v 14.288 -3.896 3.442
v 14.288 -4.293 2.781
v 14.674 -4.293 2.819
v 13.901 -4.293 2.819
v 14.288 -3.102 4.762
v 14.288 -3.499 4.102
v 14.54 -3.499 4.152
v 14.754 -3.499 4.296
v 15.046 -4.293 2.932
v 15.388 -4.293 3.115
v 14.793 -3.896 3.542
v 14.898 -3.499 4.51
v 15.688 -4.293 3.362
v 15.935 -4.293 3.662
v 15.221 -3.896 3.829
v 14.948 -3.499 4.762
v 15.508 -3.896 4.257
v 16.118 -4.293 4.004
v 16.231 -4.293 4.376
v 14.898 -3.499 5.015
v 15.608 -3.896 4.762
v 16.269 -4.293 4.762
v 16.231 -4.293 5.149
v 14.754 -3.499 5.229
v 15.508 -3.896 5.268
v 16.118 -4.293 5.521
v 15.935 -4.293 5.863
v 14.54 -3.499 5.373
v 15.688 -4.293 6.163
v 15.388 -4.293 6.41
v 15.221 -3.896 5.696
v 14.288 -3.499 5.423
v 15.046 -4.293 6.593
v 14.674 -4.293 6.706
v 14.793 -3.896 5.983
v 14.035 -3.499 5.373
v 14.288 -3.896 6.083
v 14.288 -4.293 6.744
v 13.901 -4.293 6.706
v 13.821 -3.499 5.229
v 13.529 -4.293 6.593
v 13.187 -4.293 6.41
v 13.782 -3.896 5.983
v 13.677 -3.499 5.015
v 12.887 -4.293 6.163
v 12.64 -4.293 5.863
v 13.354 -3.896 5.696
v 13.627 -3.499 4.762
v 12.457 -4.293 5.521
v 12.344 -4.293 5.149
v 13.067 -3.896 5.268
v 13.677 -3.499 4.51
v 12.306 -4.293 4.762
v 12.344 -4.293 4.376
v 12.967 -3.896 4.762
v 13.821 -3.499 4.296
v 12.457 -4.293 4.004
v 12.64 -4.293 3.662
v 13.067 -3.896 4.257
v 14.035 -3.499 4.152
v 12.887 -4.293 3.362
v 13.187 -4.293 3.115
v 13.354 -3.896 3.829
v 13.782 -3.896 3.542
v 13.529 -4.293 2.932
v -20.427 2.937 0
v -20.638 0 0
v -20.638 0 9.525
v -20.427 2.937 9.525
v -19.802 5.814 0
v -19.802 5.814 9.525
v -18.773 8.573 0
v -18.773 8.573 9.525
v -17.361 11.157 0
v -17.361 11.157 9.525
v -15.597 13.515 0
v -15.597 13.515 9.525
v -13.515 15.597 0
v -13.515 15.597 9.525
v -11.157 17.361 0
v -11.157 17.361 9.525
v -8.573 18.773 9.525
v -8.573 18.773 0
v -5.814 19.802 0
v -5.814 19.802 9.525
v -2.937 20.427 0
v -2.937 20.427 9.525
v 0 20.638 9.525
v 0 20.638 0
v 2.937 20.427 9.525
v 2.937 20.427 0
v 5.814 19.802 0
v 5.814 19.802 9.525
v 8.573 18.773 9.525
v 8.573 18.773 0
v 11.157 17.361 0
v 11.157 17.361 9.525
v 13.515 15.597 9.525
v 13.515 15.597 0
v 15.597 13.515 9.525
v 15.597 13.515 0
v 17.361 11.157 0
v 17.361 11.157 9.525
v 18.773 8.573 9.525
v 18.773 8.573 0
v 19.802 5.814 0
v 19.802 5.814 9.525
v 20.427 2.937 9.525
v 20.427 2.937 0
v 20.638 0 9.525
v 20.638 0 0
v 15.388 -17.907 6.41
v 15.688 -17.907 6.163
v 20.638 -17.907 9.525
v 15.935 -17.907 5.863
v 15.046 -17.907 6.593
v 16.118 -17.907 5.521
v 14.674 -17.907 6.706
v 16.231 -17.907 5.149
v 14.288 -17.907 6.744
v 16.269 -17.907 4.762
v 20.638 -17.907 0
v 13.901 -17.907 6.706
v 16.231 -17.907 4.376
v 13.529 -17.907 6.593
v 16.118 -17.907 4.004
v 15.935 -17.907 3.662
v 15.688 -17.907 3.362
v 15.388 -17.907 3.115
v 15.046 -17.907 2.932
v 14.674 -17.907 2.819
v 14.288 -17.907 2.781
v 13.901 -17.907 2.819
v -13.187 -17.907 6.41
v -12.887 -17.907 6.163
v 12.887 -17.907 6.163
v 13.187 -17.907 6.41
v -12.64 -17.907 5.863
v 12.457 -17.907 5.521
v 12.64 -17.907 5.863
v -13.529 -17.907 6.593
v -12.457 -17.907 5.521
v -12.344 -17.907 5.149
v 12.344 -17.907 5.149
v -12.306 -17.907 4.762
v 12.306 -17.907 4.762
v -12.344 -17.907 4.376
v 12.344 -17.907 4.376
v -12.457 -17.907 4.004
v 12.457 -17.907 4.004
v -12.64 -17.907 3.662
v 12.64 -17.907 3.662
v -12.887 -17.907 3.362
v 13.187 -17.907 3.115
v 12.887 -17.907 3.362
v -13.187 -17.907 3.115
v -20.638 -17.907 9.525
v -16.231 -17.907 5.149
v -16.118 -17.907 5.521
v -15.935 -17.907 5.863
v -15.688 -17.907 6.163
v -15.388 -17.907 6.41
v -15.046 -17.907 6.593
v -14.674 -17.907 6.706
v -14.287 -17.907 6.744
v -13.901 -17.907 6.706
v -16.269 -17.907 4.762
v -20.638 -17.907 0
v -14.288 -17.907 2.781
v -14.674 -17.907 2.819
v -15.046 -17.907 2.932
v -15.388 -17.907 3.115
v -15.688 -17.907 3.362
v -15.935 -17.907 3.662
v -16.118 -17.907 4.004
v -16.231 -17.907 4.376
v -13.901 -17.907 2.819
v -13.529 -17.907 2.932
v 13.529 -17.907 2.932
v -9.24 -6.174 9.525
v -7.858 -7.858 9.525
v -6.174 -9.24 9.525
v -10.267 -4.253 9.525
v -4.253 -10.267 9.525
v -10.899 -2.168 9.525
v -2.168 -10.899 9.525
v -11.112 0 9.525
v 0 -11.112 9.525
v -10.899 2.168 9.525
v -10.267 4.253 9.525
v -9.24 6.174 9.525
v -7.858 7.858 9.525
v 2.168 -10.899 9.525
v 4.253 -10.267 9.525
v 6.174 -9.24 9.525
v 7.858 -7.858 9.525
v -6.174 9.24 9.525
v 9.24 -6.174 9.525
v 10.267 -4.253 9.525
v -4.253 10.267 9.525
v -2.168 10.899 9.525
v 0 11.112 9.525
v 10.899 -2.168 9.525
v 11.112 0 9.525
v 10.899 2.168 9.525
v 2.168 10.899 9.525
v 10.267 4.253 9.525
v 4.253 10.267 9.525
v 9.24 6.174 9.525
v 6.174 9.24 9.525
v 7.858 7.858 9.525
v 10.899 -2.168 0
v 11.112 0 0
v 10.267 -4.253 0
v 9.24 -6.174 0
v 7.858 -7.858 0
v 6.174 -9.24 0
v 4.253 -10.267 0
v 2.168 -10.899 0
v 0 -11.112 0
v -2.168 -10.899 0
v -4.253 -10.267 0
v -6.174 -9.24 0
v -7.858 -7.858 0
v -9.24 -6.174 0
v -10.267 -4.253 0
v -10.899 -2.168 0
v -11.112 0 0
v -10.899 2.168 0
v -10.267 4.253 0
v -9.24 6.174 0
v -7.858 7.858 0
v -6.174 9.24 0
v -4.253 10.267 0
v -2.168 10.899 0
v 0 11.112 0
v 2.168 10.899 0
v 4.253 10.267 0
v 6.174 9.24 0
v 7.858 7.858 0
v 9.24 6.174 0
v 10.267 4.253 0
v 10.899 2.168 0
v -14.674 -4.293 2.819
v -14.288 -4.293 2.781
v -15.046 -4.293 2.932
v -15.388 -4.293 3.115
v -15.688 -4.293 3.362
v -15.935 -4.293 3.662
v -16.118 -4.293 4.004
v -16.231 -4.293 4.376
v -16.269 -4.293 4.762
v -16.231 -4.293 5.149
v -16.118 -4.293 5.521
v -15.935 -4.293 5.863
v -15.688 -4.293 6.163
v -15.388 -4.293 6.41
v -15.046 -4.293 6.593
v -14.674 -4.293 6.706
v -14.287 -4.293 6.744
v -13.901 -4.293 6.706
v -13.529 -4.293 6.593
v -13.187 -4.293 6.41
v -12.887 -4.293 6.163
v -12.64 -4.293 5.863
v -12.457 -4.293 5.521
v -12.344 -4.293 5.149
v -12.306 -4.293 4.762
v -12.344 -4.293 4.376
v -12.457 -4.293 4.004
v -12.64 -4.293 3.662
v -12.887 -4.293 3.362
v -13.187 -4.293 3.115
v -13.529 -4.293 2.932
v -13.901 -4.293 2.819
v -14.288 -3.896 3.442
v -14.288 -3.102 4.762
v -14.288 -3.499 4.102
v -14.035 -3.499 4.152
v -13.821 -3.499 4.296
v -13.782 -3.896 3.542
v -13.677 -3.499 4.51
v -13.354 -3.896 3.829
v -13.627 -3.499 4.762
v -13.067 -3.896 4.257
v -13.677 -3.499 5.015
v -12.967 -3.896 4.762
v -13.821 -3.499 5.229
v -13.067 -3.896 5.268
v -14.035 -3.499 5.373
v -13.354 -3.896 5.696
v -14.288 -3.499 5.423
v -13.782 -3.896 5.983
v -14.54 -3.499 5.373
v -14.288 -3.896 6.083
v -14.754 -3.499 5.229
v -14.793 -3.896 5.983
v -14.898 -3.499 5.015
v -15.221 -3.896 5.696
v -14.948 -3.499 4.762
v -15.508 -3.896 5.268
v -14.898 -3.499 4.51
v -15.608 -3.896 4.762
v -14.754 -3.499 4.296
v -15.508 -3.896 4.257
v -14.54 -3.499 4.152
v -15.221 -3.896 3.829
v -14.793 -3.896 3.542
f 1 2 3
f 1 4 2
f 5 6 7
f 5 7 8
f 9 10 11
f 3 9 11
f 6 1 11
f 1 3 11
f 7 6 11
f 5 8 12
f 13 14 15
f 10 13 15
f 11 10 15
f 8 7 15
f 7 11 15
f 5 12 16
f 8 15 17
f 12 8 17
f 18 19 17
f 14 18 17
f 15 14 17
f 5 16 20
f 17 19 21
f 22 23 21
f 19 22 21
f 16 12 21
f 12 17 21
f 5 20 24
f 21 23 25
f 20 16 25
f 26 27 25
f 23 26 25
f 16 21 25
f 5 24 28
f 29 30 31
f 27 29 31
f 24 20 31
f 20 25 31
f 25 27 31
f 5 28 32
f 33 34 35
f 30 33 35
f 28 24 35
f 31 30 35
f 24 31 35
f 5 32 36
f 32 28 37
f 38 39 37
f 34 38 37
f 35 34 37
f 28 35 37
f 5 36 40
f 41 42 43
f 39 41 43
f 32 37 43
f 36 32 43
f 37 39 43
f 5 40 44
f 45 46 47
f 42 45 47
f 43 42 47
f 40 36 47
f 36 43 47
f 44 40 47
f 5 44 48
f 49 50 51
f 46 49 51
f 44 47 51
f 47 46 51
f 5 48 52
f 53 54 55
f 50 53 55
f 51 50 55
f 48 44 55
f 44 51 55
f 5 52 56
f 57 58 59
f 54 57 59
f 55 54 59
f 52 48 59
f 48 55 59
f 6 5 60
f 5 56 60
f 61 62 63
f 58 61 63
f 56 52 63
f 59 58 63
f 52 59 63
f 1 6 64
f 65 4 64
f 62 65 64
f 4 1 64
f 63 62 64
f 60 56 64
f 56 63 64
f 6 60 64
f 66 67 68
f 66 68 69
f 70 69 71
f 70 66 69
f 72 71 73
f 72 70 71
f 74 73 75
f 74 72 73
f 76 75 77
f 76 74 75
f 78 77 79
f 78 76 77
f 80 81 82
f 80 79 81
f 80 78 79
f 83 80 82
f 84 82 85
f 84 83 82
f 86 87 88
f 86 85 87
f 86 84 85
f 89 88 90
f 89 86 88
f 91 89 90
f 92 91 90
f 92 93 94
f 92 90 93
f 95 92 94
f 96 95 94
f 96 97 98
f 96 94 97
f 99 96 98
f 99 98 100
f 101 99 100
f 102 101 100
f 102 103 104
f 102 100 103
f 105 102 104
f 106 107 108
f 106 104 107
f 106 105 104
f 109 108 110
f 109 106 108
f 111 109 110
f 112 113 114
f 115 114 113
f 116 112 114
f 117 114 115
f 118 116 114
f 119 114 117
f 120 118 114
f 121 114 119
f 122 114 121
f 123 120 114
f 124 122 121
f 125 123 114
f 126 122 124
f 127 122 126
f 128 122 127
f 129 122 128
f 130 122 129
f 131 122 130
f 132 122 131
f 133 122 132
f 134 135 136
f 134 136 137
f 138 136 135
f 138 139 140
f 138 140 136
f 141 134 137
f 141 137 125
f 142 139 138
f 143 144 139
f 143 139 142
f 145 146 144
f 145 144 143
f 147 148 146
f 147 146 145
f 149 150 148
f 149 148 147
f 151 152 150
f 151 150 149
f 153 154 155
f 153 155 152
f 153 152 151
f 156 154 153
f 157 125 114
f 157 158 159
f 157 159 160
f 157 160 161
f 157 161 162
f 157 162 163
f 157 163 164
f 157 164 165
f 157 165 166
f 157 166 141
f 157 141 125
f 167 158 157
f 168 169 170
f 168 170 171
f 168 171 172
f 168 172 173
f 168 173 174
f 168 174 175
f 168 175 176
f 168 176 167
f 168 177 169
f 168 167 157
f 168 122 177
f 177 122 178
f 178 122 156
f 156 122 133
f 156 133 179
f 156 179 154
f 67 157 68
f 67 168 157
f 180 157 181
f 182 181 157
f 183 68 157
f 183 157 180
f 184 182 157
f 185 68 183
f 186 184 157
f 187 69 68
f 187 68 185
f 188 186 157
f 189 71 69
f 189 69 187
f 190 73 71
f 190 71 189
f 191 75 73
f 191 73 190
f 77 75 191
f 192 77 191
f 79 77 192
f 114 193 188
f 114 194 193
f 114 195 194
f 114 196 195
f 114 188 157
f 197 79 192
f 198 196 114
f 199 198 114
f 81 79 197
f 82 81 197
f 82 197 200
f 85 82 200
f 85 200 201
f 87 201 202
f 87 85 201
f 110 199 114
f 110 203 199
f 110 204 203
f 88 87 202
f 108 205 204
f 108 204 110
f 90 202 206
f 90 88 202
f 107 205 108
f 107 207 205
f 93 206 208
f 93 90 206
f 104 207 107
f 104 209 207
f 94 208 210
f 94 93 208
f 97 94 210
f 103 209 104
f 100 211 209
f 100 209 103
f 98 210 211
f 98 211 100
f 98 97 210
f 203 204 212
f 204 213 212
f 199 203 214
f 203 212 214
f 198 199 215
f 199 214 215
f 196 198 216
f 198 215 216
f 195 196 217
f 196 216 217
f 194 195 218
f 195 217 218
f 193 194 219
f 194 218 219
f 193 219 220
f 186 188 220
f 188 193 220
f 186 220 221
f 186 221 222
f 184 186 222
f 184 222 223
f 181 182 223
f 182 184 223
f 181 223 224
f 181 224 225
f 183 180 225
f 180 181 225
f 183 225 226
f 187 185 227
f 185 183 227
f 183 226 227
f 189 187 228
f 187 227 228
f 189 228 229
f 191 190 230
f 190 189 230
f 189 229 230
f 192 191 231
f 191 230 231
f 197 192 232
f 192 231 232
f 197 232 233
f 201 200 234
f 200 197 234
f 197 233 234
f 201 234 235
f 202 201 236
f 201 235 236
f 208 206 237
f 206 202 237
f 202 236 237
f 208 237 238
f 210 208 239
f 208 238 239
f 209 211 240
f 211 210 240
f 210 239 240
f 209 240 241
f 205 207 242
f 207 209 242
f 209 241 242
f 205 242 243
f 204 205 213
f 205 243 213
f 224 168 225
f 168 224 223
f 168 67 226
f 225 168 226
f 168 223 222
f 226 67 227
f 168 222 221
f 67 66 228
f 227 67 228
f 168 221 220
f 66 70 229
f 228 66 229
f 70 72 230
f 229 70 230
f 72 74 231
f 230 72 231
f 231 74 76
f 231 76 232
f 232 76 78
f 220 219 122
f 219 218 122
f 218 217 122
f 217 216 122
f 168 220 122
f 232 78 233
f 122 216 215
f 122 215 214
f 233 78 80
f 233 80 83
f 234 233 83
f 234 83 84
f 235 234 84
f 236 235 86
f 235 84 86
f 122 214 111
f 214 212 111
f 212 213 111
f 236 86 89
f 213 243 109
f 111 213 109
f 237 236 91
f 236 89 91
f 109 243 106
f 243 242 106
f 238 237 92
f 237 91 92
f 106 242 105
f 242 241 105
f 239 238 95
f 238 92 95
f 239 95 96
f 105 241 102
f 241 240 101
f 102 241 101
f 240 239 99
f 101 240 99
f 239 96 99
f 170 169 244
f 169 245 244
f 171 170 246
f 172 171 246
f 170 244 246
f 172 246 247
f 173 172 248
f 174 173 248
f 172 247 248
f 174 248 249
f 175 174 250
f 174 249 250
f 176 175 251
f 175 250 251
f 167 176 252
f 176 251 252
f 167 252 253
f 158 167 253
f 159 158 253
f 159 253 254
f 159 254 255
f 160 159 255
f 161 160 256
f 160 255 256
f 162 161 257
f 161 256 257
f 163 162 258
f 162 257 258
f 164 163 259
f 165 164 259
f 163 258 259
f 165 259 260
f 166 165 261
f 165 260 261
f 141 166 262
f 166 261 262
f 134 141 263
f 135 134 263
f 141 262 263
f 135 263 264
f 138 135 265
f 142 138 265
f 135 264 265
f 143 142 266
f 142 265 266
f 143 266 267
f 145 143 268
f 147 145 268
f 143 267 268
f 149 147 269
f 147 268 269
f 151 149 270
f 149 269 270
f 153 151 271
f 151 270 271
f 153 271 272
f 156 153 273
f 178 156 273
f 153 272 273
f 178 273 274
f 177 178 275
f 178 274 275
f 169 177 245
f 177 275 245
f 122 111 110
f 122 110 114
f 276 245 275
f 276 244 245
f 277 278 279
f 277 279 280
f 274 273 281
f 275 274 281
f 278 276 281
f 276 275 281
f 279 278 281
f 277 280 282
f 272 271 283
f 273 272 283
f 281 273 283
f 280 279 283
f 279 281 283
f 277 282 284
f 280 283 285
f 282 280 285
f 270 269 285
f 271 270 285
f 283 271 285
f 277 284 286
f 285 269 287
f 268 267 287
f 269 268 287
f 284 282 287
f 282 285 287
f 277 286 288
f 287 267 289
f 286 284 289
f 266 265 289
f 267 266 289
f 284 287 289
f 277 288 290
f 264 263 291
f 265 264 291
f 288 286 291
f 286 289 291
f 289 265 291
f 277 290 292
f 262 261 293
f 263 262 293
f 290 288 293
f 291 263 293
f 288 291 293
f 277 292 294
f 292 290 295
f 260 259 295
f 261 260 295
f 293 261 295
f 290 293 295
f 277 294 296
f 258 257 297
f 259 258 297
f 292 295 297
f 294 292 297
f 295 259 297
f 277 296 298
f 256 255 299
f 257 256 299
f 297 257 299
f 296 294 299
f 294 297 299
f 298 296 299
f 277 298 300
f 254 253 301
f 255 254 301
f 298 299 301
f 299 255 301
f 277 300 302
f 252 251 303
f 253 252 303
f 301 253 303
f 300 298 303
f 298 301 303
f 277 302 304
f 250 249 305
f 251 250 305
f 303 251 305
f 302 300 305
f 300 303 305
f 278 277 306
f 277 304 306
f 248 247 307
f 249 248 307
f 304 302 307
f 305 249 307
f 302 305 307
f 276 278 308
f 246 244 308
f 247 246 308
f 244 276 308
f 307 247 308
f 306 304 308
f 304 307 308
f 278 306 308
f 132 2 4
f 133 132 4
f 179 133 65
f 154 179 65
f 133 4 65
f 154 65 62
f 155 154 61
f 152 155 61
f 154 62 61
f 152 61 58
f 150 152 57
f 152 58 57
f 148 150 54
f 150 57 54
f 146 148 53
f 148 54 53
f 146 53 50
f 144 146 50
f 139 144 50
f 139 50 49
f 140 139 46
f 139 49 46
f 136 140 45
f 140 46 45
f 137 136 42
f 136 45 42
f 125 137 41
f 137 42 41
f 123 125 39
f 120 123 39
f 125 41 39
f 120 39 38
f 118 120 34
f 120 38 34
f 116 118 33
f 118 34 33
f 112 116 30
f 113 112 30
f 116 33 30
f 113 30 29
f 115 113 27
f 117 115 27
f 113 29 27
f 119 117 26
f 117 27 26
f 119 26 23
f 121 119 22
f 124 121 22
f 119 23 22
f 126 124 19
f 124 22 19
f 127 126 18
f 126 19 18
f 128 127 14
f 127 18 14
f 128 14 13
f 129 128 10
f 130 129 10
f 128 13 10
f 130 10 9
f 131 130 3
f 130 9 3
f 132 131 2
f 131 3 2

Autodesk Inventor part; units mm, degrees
ref_plane "YZ Plane" through (0, 0, 0) normal (1, 0, 0) x (0, 1, 0)
ref_plane "XZ Plane" through (0, 0, 0) normal (0, 1, 0) x (-1, 0, 0)
ref_plane "XY Plane" through (0, 0, 0) normal (0, 0, 1) x (1, 0, 0)
sketch "Sketch1" plane through (0, 0, 0) normal (0, 0, 1) x (1, 0, 0)
  circle A0 centre (0, 0) radius 11.1125
  arc A1 (20.6375, 0) -> (-20.6375, 0) centre (0, 0) ccw
  line L0 (20.6375, 0) -> (20.6375, -17.907)
  line L1 (20.6375, -17.907) -> (-20.6375, -17.907)
  line L2 (-20.6375, -17.907) -> (-20.6375, 0)
  dimension "d0" = 22.225
  dimension "d2" = 9.525
  dimension "d3" = 17.907
extrude "Extrusion1" add sketch "Sketch1" along normal blind 9.525
sketch "Sketch2" plane through (-20.6375, -17.907, 0) normal (0, -1, 0) x (1, 0, 0)
  circle A0 centre (6.35, 4.7625) radius 2.8195
  circle A1 centre (34.925, 4.7625) radius 2.8195
  line L0 (0, 0) -> (0, 9.525) projected
  line L1 (41.275, 0) -> (41.275, 9.525) projected
  point P0 (20.6375, 0)
  point P1 (0, 4.7625)
  point P2 (41.275, 4.7625)
  dimension "d6" = 5.639
  dimension "d7" = 6.35
  dimension "d8" = 6.35
hole "Hole1" at (-14.2875, -17.907, 4.7625) at (14.2875, -17.907, 4.7625) direction (0, 1, 0) diameter 3.9624 depth 13.6144 tip angle 118 thread size "10-32 UNF" class "2B" standard "ANSI Unified Screw Threads"
properties part number "3DPRINT,VERTICAL,ROLLER,TOP,BEARING,BLOCK"
